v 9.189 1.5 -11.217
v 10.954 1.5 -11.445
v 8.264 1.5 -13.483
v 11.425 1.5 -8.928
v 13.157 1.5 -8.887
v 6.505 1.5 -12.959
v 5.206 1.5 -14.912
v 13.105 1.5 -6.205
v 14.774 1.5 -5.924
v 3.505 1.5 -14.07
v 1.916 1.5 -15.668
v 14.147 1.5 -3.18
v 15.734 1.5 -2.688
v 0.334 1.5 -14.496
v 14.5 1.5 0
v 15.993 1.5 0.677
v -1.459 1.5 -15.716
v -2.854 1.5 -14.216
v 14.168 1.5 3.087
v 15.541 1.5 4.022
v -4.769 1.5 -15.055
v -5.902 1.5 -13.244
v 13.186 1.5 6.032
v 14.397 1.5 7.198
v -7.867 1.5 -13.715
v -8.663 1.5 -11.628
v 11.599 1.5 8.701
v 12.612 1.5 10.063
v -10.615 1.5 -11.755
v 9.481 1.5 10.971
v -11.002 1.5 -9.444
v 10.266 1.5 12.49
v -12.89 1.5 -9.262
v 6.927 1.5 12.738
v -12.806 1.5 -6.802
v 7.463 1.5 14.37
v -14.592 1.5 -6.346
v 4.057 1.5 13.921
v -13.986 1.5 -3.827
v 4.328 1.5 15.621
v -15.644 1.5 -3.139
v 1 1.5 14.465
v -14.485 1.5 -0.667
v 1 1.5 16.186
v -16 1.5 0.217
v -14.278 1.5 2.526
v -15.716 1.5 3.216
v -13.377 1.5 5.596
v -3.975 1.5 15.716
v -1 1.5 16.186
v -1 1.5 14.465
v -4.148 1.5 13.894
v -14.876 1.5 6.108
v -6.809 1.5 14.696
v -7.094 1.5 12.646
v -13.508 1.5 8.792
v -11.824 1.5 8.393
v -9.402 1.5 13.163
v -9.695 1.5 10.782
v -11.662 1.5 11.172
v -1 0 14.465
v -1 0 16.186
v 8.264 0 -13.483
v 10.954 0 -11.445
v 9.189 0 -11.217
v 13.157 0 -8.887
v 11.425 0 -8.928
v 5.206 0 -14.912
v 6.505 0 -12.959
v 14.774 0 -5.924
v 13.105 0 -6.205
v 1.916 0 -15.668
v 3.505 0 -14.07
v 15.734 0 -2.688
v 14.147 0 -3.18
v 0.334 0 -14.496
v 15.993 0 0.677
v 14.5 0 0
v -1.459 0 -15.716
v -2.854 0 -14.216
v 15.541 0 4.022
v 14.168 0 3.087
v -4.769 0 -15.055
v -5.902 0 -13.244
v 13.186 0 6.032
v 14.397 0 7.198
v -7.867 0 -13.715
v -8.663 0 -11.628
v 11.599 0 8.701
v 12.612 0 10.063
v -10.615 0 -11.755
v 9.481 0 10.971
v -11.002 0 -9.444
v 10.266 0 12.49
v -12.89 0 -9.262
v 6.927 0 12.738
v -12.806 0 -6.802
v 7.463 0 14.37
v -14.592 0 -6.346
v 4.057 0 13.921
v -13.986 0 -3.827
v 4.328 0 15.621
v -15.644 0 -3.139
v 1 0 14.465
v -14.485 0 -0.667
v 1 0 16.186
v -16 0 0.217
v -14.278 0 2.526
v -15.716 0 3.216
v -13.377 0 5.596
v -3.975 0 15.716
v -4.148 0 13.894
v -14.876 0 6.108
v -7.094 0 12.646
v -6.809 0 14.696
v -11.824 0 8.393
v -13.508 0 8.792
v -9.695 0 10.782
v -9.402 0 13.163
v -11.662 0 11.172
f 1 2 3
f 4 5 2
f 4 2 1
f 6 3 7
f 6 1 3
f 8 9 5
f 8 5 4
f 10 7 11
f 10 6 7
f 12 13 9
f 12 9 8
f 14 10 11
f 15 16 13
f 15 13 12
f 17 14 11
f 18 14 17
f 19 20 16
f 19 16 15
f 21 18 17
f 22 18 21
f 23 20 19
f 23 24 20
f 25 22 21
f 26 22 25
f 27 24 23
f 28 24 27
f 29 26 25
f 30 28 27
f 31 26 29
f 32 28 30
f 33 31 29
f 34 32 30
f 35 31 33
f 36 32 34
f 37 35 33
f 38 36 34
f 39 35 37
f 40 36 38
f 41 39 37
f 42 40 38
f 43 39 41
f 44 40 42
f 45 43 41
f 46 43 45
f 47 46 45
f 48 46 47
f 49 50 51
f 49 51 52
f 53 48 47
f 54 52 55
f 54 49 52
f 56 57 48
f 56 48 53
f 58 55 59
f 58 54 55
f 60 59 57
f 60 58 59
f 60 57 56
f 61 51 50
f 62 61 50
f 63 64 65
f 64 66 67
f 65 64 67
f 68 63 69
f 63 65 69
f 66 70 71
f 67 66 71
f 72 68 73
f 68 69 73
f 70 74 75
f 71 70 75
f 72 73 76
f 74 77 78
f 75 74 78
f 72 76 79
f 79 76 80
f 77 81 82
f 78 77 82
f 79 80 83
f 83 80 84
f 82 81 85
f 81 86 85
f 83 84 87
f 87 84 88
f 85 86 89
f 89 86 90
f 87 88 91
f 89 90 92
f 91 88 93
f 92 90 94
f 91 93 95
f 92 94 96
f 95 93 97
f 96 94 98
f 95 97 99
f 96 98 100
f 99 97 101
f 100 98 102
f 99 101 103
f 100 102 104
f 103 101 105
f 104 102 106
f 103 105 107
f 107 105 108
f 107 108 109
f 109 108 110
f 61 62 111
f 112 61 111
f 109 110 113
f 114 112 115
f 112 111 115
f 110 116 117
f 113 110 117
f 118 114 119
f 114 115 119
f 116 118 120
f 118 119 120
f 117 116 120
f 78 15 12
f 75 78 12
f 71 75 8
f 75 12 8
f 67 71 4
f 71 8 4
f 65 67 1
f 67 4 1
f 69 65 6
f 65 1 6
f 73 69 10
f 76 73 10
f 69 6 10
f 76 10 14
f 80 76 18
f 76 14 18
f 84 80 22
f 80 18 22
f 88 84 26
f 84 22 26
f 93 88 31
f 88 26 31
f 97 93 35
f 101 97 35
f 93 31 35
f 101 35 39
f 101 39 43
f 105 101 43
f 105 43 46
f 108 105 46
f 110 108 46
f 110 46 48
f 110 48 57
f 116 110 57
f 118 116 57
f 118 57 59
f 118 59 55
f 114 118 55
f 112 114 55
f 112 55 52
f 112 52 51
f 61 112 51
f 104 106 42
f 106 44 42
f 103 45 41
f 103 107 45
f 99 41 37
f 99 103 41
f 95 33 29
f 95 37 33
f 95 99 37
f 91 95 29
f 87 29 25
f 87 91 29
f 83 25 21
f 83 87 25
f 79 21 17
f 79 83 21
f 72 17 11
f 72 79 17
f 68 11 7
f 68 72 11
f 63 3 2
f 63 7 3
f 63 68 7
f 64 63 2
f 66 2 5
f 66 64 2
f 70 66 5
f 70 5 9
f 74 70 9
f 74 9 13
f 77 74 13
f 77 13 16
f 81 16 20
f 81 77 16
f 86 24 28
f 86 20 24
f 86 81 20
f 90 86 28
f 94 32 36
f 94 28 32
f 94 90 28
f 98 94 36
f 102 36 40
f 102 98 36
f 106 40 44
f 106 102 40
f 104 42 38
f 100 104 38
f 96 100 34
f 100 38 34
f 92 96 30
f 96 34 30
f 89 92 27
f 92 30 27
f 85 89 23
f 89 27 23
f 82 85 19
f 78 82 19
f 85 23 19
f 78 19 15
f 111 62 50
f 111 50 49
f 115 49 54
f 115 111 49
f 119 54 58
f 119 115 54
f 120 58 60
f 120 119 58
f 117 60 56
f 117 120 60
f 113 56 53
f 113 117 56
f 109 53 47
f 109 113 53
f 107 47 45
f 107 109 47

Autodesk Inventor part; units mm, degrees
ref_plane "YZ Plane" through (0, 0, 0) normal (1, 0, 0) x (0, 1, 0)
ref_plane "XZ Plane" through (0, 0, 0) normal (0, 1, 0) x (-1, 0, 0)
ref_plane "XY Plane" through (0, 0, 0) normal (0, 0, 1) x (1, 0, 0)
sketch "Sketch1" plane through (0, 0, 0) normal (0, 1, 0) x (-1, 0, 0)
  circle A0 centre (0, 0.2173) radius 16
  point P0 (0, 0)
  dimension "d0" = 32
extrude "Extrusion1" add sketch "Sketch1" along normal blind 1.5
sketch "Sketch2" plane through (0, 1.5, 0.2173) normal (0, 1, 0) x (1, 0, 0)
  circle A0 centre (0, 0.2173) radius 14.5
  dimension "d3" = 29
extrude "Extrusion2" cut sketch "Sketch2" against normal blind 1.5
sketch "Sketch3" plane through (0, 1.5, 0.2173) normal (0, 1, 0) x (1, 0, 0)
  line L0 (-1, -17.209) -> (1, -17.209)
  line L1 (1, -17.209) -> (1, -13.4717)
  line L2 (1, -13.4717) -> (-1, -13.4717)
  line L3 (-1, -13.4717) -> (-1, -17.209)
  line L4 (-1, -17.209) -> (1, -13.4717) construction
  line L5 (1, -17.209) -> (-1, -13.4717) construction
  point P0 (0, 0.2173)
  point P1 (0, -15.3403)
  dimension "d6" = 2
extrude "Extrusion3" cut sketch "Sketch3" against normal blind 1.5
properties part number "piston compression ring"
